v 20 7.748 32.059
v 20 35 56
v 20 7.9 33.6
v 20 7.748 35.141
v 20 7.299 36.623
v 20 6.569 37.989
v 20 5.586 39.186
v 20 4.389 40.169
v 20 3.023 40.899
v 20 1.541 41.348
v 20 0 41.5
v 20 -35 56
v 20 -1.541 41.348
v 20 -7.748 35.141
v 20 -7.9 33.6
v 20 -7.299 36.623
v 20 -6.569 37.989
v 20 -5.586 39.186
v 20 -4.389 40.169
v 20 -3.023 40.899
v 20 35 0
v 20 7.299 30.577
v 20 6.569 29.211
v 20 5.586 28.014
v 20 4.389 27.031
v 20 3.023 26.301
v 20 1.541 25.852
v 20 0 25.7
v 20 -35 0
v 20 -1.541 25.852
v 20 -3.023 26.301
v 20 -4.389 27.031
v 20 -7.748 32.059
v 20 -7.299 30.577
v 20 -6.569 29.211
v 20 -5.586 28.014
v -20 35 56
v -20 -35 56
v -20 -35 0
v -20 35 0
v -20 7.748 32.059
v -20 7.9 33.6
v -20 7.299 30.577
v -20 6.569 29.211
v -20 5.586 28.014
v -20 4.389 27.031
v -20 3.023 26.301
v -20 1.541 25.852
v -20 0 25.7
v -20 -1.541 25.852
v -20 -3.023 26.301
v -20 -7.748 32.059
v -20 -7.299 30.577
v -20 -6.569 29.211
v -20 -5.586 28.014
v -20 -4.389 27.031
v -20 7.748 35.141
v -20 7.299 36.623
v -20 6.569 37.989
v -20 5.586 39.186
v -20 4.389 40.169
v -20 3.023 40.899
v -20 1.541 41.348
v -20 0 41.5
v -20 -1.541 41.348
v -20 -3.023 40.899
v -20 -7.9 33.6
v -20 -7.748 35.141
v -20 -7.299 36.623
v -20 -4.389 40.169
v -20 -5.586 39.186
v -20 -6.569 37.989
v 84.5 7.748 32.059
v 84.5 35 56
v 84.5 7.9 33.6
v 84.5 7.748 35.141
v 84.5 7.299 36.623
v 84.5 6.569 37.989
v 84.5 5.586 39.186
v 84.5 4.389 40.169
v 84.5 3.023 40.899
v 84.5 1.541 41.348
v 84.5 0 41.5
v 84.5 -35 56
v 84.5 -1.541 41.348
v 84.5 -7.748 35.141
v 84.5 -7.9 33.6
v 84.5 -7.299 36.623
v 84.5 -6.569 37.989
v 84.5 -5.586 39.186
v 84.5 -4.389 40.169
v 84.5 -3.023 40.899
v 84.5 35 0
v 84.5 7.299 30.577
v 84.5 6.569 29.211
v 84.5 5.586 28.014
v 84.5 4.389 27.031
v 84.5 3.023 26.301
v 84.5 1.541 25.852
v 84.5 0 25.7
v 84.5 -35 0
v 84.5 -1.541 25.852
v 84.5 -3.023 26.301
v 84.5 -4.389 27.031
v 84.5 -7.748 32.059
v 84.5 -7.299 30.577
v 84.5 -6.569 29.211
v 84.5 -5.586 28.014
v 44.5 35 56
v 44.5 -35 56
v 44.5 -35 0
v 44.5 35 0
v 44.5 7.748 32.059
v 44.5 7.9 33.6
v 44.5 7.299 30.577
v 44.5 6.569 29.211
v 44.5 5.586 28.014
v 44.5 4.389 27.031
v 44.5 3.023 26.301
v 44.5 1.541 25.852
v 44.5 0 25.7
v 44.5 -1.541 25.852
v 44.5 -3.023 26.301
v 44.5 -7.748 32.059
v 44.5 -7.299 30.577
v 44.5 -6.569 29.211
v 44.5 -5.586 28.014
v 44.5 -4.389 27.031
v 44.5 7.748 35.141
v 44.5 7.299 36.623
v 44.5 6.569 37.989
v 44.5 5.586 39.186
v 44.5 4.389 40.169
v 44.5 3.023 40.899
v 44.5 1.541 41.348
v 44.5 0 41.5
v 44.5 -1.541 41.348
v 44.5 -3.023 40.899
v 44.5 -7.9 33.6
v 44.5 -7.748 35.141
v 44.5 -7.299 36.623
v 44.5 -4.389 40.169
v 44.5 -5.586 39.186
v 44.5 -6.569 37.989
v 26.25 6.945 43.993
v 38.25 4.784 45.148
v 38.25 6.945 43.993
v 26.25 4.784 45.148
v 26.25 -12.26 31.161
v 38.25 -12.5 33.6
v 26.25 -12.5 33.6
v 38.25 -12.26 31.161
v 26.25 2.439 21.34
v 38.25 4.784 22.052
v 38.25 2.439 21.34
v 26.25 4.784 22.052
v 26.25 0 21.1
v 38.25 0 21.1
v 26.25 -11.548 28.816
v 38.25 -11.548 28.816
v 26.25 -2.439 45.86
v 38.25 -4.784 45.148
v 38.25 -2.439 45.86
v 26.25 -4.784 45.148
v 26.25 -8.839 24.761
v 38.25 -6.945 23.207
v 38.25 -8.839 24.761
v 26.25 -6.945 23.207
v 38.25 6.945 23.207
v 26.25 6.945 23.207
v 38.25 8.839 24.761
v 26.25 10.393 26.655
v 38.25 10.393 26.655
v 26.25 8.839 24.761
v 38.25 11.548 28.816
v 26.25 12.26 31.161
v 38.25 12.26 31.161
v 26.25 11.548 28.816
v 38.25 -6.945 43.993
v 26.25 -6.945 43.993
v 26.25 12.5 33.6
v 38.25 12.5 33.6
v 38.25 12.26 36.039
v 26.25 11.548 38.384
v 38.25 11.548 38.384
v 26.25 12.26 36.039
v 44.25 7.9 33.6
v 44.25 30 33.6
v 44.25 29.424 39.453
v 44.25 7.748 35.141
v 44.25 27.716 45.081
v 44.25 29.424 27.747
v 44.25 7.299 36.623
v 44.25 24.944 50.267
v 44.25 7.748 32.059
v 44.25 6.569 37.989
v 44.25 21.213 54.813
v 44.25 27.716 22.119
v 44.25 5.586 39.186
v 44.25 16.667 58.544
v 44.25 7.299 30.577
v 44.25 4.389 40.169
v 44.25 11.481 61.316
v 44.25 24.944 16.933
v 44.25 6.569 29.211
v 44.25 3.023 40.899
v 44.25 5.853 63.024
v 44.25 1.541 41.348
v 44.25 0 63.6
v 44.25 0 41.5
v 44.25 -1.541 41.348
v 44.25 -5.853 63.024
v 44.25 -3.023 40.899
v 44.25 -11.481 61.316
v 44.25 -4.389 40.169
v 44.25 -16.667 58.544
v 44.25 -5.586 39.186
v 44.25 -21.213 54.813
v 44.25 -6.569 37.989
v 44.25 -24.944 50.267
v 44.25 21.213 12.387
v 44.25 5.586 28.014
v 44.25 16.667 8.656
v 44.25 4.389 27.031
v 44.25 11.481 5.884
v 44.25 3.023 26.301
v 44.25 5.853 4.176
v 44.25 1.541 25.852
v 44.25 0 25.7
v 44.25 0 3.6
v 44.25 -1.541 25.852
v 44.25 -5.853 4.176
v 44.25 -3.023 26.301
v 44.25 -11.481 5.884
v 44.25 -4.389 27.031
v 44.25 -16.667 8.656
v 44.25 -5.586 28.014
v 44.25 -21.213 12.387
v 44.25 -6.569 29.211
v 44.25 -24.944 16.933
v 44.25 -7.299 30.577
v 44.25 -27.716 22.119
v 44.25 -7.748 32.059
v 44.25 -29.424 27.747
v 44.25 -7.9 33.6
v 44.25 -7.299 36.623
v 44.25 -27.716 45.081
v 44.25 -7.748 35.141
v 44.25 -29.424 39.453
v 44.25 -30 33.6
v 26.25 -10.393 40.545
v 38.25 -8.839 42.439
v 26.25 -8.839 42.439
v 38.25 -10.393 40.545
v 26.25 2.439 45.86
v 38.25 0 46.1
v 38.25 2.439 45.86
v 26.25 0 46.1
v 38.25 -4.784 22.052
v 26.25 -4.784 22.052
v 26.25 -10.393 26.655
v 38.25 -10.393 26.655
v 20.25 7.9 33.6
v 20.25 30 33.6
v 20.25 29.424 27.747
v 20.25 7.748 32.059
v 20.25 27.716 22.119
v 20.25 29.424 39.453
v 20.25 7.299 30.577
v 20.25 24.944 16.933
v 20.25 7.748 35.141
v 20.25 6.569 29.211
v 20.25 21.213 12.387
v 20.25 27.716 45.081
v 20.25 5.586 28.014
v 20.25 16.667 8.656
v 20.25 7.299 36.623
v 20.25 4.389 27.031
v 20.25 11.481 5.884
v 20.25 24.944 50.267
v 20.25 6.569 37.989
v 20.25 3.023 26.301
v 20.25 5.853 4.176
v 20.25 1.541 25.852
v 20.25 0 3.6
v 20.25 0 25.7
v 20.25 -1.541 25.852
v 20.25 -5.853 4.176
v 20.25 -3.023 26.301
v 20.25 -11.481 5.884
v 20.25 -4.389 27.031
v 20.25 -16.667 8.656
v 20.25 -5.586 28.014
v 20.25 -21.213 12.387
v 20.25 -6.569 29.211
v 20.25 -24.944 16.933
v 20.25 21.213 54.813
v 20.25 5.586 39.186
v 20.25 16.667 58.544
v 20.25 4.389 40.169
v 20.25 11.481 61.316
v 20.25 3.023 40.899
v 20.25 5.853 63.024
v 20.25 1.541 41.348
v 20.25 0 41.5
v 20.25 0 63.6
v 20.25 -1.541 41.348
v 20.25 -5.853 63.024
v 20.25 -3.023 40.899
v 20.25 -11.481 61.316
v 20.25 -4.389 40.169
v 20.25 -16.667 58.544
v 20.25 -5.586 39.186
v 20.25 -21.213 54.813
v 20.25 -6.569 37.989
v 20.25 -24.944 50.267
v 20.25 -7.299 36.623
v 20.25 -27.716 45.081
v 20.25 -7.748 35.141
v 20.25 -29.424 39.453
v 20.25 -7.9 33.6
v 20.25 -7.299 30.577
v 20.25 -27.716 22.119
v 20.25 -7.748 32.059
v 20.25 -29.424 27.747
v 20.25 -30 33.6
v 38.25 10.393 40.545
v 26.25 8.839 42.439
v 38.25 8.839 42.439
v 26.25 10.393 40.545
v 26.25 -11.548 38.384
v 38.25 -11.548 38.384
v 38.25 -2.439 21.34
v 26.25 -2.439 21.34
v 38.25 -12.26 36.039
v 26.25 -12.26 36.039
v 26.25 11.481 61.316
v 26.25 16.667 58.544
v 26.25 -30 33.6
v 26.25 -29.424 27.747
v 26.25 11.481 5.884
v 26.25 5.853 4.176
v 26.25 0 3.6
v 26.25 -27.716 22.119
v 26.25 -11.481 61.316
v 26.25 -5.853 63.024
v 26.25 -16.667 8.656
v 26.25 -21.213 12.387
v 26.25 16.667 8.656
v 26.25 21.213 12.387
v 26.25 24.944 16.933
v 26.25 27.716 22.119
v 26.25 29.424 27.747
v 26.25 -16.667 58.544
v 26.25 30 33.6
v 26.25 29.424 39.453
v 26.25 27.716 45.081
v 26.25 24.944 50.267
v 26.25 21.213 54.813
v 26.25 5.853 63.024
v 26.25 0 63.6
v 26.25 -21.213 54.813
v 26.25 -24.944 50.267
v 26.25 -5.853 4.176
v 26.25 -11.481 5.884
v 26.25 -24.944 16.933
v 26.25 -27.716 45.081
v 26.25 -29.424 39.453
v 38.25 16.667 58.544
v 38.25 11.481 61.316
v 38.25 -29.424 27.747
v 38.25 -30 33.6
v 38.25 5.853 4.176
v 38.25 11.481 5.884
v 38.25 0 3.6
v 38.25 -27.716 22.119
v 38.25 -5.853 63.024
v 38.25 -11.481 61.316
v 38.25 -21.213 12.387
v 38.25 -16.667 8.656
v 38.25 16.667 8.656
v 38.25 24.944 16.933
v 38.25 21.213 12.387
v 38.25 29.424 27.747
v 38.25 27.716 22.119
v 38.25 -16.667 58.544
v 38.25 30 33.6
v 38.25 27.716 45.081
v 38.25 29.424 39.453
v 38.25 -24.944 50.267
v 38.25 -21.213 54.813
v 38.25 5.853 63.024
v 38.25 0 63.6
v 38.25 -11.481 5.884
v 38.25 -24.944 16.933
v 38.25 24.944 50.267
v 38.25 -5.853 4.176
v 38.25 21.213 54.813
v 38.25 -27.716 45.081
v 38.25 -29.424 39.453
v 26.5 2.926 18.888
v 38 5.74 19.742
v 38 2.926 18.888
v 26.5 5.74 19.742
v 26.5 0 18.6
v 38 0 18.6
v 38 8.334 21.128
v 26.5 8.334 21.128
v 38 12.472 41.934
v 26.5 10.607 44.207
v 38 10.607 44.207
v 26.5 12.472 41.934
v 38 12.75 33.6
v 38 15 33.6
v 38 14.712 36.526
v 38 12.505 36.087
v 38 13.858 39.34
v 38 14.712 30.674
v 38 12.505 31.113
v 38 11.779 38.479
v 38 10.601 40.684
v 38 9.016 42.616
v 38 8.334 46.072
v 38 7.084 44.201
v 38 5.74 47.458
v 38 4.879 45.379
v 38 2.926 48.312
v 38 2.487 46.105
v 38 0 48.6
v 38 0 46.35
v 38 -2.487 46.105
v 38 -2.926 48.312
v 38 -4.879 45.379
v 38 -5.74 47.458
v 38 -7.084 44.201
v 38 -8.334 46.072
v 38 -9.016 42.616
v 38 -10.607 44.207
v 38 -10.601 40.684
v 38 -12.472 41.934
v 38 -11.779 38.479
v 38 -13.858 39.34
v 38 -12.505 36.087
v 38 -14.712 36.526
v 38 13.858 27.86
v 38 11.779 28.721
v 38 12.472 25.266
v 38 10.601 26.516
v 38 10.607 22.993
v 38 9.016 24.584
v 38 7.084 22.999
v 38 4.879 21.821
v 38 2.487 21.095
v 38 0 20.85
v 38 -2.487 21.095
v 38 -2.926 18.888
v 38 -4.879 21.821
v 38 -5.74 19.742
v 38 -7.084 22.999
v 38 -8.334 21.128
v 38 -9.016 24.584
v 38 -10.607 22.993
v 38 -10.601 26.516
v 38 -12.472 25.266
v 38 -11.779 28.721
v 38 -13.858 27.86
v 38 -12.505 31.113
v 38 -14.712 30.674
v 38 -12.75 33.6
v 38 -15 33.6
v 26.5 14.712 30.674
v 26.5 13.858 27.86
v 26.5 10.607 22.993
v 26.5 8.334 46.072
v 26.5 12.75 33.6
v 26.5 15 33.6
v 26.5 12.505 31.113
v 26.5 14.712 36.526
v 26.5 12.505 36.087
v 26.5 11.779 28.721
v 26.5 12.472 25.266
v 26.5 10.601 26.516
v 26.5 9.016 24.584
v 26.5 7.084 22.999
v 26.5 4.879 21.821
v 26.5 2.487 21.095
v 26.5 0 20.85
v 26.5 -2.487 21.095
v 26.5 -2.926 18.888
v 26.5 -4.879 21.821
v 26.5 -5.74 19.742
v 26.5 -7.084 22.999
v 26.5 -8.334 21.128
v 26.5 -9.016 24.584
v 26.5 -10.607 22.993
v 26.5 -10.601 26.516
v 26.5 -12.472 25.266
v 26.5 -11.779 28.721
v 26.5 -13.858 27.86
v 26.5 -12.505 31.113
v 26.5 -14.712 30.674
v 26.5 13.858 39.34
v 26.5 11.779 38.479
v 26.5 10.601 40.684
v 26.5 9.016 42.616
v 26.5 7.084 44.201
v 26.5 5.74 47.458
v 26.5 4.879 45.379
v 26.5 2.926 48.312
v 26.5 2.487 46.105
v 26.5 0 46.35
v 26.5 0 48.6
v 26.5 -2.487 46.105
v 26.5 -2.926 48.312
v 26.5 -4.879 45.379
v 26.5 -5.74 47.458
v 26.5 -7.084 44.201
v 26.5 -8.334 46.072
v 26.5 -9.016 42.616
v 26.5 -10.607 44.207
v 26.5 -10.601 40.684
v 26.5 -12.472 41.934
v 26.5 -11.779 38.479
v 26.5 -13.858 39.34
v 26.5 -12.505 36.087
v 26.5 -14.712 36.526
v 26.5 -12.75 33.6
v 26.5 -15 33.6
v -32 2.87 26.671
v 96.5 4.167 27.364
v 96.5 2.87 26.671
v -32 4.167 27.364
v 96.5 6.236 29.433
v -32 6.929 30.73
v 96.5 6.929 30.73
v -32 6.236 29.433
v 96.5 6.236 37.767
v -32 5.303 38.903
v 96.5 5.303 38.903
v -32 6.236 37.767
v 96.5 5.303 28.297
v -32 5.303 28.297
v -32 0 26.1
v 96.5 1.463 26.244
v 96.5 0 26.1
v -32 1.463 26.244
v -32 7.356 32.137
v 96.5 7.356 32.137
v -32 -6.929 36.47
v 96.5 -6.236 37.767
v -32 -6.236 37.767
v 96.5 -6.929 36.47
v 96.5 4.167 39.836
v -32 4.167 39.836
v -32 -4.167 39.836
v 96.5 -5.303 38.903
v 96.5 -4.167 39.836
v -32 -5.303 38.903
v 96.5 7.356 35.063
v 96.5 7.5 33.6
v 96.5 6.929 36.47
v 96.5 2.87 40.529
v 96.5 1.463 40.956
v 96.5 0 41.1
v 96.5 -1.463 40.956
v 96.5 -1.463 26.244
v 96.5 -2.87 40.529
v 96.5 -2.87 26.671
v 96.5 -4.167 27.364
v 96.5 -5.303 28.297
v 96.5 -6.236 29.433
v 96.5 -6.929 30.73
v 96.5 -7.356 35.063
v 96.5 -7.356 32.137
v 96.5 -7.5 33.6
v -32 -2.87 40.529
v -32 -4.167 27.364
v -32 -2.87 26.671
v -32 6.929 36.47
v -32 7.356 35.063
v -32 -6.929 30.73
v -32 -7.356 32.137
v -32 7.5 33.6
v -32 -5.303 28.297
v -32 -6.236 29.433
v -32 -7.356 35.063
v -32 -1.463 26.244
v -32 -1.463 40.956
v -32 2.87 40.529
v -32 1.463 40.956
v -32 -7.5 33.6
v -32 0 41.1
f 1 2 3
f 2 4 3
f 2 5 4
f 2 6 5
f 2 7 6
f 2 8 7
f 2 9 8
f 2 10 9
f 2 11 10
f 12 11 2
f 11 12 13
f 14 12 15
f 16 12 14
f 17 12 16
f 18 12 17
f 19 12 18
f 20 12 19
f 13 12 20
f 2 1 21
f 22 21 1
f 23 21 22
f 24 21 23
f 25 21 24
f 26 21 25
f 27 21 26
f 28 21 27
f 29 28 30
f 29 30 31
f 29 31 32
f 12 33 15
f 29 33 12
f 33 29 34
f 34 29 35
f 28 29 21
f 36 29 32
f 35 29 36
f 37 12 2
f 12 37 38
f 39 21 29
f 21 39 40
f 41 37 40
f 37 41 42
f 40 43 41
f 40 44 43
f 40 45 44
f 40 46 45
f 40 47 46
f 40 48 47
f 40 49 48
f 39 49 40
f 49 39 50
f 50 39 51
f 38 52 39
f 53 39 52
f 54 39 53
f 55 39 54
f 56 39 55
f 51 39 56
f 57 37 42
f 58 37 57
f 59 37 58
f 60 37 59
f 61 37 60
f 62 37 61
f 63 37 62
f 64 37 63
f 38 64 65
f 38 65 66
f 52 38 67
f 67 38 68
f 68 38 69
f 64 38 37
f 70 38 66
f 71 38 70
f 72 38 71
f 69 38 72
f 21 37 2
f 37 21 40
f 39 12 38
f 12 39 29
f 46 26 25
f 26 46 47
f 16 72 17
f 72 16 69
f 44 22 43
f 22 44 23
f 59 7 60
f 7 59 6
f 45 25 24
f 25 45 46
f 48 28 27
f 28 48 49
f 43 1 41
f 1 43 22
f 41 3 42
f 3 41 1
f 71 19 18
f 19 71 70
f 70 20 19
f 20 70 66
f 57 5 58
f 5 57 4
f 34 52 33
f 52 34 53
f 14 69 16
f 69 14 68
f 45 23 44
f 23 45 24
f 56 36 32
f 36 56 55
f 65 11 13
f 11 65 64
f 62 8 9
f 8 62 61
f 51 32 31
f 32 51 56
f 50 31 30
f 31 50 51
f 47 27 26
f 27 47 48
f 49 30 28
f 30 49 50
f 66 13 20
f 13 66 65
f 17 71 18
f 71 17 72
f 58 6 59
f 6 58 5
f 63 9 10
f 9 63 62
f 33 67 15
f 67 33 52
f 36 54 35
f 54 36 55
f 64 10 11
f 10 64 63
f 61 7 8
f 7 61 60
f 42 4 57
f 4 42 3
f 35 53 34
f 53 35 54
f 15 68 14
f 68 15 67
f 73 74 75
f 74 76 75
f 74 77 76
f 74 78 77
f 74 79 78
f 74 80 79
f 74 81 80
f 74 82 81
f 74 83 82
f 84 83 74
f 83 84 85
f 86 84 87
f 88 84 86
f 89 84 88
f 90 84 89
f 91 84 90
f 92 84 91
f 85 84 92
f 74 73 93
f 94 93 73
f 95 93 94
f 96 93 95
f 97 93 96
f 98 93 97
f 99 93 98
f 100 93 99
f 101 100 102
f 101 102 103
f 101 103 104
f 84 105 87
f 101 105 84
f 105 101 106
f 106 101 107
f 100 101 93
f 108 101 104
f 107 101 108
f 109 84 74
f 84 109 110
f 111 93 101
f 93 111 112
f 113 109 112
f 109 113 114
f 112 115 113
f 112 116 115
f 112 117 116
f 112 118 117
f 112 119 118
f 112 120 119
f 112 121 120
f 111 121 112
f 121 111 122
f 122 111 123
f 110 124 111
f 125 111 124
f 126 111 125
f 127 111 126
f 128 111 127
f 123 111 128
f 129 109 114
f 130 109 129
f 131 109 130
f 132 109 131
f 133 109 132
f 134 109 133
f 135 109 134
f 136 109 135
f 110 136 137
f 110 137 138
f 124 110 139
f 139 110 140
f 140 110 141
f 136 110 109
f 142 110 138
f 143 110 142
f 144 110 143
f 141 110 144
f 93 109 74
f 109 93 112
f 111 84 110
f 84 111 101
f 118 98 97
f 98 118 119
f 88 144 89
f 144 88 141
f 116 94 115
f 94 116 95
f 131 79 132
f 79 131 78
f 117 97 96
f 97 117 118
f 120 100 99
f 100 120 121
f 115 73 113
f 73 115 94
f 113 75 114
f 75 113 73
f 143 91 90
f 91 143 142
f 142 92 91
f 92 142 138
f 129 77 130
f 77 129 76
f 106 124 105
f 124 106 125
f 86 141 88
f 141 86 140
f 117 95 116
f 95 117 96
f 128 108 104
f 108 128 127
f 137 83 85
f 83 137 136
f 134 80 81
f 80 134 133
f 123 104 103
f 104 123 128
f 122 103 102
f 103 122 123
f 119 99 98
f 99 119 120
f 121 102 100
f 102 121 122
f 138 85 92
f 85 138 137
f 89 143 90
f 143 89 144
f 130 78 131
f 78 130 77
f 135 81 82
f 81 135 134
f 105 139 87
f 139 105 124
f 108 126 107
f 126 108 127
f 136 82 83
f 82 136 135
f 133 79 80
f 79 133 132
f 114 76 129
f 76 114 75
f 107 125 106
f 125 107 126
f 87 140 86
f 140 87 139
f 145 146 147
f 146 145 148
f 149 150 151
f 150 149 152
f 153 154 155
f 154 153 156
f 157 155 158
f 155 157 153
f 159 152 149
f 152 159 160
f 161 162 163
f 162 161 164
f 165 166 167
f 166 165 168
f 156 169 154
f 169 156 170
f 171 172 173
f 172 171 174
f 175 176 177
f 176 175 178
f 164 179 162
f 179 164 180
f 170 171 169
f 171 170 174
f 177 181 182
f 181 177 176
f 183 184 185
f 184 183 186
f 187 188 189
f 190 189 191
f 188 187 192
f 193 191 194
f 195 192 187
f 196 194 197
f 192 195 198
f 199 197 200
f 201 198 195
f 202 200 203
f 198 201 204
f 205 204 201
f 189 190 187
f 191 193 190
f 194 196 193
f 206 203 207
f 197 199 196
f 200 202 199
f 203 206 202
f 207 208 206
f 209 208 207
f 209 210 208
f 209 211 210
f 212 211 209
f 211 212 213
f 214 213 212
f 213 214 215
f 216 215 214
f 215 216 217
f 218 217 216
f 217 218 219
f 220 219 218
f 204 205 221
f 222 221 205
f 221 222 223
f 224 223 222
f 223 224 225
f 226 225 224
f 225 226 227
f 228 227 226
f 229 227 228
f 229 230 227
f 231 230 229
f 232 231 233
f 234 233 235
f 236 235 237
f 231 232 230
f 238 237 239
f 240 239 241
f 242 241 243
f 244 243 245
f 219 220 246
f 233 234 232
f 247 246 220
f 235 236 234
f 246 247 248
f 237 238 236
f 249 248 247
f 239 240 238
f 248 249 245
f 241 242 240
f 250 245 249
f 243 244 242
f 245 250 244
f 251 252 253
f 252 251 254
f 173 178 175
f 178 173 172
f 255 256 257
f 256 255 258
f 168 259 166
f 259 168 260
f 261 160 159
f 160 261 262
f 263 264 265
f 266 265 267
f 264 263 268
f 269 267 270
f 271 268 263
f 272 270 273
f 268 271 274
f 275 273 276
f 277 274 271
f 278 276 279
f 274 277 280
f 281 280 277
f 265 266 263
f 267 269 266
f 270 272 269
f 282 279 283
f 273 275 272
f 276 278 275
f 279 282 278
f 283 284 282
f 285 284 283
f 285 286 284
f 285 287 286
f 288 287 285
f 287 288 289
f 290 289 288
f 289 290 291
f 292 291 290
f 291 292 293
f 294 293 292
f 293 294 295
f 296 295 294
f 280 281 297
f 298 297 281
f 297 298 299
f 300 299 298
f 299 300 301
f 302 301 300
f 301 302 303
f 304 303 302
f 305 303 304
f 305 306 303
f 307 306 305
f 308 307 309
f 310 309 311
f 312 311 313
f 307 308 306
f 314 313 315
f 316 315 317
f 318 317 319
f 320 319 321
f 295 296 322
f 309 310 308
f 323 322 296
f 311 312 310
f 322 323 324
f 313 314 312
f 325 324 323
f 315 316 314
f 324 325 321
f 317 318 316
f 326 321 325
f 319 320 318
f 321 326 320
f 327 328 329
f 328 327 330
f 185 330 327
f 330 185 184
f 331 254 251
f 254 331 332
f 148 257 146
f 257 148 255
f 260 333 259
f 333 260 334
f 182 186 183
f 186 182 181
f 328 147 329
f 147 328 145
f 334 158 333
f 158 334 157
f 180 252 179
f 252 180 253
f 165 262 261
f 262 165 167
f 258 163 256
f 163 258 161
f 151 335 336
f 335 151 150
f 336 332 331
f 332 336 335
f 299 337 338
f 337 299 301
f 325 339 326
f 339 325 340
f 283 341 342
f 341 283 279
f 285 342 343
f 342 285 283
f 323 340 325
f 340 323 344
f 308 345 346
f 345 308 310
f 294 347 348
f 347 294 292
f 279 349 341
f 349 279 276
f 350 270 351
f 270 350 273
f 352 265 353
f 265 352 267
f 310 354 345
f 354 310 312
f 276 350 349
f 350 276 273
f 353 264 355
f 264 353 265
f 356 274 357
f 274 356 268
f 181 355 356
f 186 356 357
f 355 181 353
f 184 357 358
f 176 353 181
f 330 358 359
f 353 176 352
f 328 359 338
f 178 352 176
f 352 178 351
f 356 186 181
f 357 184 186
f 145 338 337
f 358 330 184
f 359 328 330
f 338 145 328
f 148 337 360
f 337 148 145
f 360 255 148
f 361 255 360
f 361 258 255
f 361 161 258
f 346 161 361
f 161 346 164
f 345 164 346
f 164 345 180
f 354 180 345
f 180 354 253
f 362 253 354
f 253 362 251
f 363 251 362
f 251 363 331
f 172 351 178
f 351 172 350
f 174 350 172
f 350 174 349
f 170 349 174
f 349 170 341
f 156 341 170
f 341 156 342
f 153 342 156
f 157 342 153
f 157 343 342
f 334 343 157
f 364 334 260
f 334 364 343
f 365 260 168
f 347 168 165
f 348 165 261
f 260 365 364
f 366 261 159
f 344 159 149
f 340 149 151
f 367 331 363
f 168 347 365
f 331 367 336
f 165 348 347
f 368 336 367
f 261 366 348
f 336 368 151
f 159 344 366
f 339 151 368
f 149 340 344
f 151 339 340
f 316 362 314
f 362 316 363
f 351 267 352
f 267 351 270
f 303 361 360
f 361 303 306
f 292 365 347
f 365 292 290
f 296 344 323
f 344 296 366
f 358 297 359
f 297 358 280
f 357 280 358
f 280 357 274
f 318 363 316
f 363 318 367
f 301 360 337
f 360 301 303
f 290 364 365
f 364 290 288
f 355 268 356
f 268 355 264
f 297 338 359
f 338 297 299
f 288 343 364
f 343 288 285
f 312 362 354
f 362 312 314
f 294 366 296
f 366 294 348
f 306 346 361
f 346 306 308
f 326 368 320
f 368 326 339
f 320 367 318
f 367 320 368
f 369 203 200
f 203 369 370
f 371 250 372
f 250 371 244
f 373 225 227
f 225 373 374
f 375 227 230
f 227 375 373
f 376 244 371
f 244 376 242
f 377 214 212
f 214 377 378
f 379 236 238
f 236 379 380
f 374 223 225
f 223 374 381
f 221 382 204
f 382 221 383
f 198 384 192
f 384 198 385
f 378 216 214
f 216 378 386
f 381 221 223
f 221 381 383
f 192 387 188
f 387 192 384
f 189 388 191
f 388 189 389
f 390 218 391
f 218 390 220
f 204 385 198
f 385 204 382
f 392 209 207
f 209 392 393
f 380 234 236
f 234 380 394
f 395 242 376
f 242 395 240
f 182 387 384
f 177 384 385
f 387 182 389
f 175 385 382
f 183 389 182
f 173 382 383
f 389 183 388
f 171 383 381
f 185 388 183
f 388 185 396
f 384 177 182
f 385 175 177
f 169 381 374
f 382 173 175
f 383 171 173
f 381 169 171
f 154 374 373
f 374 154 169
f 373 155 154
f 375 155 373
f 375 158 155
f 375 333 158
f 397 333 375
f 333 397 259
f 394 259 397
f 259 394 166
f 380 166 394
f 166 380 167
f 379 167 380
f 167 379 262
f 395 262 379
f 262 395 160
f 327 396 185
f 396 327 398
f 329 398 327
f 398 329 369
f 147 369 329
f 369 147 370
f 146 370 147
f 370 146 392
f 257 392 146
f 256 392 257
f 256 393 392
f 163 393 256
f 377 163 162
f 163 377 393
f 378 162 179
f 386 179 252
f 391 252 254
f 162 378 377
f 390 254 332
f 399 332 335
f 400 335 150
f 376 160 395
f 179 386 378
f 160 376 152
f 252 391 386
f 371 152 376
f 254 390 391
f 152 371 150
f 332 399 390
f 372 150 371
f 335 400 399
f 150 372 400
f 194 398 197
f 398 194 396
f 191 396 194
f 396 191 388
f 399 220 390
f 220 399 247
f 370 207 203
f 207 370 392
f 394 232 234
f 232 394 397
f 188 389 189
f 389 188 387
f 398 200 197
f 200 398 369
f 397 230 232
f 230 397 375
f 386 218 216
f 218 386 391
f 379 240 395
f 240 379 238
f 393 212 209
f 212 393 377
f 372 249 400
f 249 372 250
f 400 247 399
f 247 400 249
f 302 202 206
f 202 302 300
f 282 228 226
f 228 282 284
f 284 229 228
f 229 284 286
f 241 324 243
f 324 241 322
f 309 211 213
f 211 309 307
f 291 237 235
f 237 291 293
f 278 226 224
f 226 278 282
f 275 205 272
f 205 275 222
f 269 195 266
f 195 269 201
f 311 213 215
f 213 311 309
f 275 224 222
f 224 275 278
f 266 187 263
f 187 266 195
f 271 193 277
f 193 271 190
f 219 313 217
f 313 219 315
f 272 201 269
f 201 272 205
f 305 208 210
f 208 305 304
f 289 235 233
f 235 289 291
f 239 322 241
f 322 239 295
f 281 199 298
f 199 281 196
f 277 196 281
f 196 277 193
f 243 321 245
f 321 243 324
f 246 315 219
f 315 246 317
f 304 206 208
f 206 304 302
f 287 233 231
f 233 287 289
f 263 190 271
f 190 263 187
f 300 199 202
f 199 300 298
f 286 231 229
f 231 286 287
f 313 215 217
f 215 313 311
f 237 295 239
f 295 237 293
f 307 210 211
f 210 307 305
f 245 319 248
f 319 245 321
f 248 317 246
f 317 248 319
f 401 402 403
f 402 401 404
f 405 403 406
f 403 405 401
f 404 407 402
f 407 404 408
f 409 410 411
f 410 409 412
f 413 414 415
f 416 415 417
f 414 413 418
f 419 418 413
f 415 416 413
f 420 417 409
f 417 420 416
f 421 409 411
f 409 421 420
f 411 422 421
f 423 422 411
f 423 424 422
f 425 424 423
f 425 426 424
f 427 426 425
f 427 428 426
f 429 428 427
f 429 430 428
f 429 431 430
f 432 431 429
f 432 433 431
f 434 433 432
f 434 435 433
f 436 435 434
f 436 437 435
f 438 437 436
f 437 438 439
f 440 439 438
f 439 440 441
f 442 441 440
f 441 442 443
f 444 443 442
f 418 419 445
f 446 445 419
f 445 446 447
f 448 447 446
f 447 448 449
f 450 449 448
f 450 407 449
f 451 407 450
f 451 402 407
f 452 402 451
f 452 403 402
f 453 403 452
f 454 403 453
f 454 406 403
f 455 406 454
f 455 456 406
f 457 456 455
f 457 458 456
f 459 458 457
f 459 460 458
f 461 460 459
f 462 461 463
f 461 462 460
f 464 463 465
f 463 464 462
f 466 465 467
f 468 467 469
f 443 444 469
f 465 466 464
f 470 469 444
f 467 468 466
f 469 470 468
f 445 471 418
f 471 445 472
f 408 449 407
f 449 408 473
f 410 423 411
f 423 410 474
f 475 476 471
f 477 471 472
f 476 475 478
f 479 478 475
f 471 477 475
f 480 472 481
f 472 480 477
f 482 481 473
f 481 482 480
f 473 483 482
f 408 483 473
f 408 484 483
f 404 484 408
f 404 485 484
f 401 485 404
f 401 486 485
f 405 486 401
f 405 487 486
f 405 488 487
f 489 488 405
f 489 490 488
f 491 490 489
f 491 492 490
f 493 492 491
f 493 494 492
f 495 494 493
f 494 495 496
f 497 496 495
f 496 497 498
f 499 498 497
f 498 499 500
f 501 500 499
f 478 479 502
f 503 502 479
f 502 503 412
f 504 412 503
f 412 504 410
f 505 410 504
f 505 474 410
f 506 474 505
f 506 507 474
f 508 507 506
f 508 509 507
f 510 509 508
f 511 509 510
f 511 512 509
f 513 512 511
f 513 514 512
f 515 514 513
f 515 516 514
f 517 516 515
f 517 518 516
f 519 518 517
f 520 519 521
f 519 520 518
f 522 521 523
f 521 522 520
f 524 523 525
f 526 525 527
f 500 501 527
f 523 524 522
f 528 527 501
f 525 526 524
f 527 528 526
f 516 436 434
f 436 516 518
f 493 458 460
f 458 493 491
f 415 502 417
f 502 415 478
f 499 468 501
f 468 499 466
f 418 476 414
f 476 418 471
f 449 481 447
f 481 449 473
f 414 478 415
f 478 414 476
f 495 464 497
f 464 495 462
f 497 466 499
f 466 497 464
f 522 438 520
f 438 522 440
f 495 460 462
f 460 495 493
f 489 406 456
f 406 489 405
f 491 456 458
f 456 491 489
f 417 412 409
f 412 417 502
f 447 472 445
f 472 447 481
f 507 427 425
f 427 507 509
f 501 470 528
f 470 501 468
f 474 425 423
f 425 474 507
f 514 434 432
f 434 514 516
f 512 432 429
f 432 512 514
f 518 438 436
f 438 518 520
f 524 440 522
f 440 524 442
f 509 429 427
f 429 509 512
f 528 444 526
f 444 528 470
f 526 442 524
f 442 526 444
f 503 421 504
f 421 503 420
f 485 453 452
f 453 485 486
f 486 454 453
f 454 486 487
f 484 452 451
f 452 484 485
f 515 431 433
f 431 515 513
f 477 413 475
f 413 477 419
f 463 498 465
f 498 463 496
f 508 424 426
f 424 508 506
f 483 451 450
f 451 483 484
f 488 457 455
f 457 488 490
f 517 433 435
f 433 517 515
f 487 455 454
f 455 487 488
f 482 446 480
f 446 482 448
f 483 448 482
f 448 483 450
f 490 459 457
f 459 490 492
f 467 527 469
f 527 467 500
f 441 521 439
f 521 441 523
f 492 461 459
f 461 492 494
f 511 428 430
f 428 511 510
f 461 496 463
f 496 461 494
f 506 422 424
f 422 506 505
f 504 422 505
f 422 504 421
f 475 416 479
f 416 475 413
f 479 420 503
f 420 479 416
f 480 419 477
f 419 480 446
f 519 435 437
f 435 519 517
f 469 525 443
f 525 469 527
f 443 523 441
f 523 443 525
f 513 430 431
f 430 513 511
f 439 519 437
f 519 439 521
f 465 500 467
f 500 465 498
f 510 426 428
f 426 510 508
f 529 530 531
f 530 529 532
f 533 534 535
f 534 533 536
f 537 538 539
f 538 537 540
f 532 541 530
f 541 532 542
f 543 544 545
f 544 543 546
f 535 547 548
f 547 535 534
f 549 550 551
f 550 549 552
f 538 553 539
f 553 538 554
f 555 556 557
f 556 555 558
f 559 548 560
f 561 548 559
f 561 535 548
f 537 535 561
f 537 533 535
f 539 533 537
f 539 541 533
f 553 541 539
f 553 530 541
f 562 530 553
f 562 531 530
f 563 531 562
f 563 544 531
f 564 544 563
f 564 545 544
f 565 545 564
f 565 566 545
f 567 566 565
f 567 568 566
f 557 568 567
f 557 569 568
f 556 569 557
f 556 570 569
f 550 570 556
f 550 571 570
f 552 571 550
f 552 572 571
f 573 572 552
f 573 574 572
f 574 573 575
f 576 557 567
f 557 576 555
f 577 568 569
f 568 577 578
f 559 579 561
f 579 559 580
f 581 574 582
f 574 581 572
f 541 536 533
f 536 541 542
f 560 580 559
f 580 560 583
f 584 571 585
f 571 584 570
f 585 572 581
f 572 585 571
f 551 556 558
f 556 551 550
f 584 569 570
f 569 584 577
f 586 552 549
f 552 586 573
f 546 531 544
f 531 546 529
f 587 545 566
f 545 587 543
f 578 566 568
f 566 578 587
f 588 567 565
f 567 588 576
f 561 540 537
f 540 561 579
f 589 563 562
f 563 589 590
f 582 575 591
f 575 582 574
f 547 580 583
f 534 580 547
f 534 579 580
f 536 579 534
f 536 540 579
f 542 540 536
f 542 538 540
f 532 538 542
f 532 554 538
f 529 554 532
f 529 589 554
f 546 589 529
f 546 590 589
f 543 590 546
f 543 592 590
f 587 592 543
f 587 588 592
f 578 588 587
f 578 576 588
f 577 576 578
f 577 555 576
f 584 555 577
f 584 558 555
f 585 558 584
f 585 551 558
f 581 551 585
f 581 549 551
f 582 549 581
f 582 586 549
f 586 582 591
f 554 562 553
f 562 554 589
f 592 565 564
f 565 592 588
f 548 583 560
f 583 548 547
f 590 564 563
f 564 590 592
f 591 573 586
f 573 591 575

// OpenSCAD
$fn = 32;

// ------------------------------------------------------------------------
// Pulley assembly: d60 pulley with a belt, shaft d15
// Every part is its own module, assembly() places them once.
// ------------------------------------------------------------------------

// --- part 1 ---
module support1() {
  difference() {
    translate([-20, -35, 0]) cube([40, 70, 56]);
    translate([0, 0, 33.6]) rotate([0, 90, 0]) cylinder(h = 42, d = 15.8, center = true);
  }
}

// --- part 2 ---
module support2() {
  difference() {
    translate([-20, -35, 0]) cube([40, 70, 56]);
    translate([0, 0, 33.6]) rotate([0, 90, 0]) cylinder(h = 42, d = 15.8, center = true);
  }
}

// --- part 3 ---
module shaft() {
  translate([0, 0, -64.25]) cylinder(h = 128.5, d = 15);
}

// --- part 4 ---
module pulley() {
  difference() {
    union() {
      cylinder(h = 24, d = 25);
      cylinder(h = 6, d = 60);
      translate([0, 0, 18]) cylinder(h = 6, d = 60);
    }
    translate([0, 0, -1]) cylinder(h = 26, d = 15.8);
  }
}

// --- part 5 ---
module belt() {
  difference() {
      translate([0, 0, 0]) cylinder(h = 11.5, d = 30);
      translate([0, 0, -1]) cylinder(h = 13.5, d = 25.5);
    }
}

// --- assembly ---
module assembly() {
  translate([0, 0, 0]) rotate([0, 0, 0]) support1();
  translate([64.5, 0, 0]) rotate([0, 0, 0]) support2();
  translate([32.25, 0, 33.6]) rotate([0, 90, 0]) shaft();
  translate([20.25, 0, 33.6]) rotate([0, 90, 0]) pulley();
  translate([26.5, 0, 33.6]) rotate([0, 90, 0]) belt();
}

assembly();
